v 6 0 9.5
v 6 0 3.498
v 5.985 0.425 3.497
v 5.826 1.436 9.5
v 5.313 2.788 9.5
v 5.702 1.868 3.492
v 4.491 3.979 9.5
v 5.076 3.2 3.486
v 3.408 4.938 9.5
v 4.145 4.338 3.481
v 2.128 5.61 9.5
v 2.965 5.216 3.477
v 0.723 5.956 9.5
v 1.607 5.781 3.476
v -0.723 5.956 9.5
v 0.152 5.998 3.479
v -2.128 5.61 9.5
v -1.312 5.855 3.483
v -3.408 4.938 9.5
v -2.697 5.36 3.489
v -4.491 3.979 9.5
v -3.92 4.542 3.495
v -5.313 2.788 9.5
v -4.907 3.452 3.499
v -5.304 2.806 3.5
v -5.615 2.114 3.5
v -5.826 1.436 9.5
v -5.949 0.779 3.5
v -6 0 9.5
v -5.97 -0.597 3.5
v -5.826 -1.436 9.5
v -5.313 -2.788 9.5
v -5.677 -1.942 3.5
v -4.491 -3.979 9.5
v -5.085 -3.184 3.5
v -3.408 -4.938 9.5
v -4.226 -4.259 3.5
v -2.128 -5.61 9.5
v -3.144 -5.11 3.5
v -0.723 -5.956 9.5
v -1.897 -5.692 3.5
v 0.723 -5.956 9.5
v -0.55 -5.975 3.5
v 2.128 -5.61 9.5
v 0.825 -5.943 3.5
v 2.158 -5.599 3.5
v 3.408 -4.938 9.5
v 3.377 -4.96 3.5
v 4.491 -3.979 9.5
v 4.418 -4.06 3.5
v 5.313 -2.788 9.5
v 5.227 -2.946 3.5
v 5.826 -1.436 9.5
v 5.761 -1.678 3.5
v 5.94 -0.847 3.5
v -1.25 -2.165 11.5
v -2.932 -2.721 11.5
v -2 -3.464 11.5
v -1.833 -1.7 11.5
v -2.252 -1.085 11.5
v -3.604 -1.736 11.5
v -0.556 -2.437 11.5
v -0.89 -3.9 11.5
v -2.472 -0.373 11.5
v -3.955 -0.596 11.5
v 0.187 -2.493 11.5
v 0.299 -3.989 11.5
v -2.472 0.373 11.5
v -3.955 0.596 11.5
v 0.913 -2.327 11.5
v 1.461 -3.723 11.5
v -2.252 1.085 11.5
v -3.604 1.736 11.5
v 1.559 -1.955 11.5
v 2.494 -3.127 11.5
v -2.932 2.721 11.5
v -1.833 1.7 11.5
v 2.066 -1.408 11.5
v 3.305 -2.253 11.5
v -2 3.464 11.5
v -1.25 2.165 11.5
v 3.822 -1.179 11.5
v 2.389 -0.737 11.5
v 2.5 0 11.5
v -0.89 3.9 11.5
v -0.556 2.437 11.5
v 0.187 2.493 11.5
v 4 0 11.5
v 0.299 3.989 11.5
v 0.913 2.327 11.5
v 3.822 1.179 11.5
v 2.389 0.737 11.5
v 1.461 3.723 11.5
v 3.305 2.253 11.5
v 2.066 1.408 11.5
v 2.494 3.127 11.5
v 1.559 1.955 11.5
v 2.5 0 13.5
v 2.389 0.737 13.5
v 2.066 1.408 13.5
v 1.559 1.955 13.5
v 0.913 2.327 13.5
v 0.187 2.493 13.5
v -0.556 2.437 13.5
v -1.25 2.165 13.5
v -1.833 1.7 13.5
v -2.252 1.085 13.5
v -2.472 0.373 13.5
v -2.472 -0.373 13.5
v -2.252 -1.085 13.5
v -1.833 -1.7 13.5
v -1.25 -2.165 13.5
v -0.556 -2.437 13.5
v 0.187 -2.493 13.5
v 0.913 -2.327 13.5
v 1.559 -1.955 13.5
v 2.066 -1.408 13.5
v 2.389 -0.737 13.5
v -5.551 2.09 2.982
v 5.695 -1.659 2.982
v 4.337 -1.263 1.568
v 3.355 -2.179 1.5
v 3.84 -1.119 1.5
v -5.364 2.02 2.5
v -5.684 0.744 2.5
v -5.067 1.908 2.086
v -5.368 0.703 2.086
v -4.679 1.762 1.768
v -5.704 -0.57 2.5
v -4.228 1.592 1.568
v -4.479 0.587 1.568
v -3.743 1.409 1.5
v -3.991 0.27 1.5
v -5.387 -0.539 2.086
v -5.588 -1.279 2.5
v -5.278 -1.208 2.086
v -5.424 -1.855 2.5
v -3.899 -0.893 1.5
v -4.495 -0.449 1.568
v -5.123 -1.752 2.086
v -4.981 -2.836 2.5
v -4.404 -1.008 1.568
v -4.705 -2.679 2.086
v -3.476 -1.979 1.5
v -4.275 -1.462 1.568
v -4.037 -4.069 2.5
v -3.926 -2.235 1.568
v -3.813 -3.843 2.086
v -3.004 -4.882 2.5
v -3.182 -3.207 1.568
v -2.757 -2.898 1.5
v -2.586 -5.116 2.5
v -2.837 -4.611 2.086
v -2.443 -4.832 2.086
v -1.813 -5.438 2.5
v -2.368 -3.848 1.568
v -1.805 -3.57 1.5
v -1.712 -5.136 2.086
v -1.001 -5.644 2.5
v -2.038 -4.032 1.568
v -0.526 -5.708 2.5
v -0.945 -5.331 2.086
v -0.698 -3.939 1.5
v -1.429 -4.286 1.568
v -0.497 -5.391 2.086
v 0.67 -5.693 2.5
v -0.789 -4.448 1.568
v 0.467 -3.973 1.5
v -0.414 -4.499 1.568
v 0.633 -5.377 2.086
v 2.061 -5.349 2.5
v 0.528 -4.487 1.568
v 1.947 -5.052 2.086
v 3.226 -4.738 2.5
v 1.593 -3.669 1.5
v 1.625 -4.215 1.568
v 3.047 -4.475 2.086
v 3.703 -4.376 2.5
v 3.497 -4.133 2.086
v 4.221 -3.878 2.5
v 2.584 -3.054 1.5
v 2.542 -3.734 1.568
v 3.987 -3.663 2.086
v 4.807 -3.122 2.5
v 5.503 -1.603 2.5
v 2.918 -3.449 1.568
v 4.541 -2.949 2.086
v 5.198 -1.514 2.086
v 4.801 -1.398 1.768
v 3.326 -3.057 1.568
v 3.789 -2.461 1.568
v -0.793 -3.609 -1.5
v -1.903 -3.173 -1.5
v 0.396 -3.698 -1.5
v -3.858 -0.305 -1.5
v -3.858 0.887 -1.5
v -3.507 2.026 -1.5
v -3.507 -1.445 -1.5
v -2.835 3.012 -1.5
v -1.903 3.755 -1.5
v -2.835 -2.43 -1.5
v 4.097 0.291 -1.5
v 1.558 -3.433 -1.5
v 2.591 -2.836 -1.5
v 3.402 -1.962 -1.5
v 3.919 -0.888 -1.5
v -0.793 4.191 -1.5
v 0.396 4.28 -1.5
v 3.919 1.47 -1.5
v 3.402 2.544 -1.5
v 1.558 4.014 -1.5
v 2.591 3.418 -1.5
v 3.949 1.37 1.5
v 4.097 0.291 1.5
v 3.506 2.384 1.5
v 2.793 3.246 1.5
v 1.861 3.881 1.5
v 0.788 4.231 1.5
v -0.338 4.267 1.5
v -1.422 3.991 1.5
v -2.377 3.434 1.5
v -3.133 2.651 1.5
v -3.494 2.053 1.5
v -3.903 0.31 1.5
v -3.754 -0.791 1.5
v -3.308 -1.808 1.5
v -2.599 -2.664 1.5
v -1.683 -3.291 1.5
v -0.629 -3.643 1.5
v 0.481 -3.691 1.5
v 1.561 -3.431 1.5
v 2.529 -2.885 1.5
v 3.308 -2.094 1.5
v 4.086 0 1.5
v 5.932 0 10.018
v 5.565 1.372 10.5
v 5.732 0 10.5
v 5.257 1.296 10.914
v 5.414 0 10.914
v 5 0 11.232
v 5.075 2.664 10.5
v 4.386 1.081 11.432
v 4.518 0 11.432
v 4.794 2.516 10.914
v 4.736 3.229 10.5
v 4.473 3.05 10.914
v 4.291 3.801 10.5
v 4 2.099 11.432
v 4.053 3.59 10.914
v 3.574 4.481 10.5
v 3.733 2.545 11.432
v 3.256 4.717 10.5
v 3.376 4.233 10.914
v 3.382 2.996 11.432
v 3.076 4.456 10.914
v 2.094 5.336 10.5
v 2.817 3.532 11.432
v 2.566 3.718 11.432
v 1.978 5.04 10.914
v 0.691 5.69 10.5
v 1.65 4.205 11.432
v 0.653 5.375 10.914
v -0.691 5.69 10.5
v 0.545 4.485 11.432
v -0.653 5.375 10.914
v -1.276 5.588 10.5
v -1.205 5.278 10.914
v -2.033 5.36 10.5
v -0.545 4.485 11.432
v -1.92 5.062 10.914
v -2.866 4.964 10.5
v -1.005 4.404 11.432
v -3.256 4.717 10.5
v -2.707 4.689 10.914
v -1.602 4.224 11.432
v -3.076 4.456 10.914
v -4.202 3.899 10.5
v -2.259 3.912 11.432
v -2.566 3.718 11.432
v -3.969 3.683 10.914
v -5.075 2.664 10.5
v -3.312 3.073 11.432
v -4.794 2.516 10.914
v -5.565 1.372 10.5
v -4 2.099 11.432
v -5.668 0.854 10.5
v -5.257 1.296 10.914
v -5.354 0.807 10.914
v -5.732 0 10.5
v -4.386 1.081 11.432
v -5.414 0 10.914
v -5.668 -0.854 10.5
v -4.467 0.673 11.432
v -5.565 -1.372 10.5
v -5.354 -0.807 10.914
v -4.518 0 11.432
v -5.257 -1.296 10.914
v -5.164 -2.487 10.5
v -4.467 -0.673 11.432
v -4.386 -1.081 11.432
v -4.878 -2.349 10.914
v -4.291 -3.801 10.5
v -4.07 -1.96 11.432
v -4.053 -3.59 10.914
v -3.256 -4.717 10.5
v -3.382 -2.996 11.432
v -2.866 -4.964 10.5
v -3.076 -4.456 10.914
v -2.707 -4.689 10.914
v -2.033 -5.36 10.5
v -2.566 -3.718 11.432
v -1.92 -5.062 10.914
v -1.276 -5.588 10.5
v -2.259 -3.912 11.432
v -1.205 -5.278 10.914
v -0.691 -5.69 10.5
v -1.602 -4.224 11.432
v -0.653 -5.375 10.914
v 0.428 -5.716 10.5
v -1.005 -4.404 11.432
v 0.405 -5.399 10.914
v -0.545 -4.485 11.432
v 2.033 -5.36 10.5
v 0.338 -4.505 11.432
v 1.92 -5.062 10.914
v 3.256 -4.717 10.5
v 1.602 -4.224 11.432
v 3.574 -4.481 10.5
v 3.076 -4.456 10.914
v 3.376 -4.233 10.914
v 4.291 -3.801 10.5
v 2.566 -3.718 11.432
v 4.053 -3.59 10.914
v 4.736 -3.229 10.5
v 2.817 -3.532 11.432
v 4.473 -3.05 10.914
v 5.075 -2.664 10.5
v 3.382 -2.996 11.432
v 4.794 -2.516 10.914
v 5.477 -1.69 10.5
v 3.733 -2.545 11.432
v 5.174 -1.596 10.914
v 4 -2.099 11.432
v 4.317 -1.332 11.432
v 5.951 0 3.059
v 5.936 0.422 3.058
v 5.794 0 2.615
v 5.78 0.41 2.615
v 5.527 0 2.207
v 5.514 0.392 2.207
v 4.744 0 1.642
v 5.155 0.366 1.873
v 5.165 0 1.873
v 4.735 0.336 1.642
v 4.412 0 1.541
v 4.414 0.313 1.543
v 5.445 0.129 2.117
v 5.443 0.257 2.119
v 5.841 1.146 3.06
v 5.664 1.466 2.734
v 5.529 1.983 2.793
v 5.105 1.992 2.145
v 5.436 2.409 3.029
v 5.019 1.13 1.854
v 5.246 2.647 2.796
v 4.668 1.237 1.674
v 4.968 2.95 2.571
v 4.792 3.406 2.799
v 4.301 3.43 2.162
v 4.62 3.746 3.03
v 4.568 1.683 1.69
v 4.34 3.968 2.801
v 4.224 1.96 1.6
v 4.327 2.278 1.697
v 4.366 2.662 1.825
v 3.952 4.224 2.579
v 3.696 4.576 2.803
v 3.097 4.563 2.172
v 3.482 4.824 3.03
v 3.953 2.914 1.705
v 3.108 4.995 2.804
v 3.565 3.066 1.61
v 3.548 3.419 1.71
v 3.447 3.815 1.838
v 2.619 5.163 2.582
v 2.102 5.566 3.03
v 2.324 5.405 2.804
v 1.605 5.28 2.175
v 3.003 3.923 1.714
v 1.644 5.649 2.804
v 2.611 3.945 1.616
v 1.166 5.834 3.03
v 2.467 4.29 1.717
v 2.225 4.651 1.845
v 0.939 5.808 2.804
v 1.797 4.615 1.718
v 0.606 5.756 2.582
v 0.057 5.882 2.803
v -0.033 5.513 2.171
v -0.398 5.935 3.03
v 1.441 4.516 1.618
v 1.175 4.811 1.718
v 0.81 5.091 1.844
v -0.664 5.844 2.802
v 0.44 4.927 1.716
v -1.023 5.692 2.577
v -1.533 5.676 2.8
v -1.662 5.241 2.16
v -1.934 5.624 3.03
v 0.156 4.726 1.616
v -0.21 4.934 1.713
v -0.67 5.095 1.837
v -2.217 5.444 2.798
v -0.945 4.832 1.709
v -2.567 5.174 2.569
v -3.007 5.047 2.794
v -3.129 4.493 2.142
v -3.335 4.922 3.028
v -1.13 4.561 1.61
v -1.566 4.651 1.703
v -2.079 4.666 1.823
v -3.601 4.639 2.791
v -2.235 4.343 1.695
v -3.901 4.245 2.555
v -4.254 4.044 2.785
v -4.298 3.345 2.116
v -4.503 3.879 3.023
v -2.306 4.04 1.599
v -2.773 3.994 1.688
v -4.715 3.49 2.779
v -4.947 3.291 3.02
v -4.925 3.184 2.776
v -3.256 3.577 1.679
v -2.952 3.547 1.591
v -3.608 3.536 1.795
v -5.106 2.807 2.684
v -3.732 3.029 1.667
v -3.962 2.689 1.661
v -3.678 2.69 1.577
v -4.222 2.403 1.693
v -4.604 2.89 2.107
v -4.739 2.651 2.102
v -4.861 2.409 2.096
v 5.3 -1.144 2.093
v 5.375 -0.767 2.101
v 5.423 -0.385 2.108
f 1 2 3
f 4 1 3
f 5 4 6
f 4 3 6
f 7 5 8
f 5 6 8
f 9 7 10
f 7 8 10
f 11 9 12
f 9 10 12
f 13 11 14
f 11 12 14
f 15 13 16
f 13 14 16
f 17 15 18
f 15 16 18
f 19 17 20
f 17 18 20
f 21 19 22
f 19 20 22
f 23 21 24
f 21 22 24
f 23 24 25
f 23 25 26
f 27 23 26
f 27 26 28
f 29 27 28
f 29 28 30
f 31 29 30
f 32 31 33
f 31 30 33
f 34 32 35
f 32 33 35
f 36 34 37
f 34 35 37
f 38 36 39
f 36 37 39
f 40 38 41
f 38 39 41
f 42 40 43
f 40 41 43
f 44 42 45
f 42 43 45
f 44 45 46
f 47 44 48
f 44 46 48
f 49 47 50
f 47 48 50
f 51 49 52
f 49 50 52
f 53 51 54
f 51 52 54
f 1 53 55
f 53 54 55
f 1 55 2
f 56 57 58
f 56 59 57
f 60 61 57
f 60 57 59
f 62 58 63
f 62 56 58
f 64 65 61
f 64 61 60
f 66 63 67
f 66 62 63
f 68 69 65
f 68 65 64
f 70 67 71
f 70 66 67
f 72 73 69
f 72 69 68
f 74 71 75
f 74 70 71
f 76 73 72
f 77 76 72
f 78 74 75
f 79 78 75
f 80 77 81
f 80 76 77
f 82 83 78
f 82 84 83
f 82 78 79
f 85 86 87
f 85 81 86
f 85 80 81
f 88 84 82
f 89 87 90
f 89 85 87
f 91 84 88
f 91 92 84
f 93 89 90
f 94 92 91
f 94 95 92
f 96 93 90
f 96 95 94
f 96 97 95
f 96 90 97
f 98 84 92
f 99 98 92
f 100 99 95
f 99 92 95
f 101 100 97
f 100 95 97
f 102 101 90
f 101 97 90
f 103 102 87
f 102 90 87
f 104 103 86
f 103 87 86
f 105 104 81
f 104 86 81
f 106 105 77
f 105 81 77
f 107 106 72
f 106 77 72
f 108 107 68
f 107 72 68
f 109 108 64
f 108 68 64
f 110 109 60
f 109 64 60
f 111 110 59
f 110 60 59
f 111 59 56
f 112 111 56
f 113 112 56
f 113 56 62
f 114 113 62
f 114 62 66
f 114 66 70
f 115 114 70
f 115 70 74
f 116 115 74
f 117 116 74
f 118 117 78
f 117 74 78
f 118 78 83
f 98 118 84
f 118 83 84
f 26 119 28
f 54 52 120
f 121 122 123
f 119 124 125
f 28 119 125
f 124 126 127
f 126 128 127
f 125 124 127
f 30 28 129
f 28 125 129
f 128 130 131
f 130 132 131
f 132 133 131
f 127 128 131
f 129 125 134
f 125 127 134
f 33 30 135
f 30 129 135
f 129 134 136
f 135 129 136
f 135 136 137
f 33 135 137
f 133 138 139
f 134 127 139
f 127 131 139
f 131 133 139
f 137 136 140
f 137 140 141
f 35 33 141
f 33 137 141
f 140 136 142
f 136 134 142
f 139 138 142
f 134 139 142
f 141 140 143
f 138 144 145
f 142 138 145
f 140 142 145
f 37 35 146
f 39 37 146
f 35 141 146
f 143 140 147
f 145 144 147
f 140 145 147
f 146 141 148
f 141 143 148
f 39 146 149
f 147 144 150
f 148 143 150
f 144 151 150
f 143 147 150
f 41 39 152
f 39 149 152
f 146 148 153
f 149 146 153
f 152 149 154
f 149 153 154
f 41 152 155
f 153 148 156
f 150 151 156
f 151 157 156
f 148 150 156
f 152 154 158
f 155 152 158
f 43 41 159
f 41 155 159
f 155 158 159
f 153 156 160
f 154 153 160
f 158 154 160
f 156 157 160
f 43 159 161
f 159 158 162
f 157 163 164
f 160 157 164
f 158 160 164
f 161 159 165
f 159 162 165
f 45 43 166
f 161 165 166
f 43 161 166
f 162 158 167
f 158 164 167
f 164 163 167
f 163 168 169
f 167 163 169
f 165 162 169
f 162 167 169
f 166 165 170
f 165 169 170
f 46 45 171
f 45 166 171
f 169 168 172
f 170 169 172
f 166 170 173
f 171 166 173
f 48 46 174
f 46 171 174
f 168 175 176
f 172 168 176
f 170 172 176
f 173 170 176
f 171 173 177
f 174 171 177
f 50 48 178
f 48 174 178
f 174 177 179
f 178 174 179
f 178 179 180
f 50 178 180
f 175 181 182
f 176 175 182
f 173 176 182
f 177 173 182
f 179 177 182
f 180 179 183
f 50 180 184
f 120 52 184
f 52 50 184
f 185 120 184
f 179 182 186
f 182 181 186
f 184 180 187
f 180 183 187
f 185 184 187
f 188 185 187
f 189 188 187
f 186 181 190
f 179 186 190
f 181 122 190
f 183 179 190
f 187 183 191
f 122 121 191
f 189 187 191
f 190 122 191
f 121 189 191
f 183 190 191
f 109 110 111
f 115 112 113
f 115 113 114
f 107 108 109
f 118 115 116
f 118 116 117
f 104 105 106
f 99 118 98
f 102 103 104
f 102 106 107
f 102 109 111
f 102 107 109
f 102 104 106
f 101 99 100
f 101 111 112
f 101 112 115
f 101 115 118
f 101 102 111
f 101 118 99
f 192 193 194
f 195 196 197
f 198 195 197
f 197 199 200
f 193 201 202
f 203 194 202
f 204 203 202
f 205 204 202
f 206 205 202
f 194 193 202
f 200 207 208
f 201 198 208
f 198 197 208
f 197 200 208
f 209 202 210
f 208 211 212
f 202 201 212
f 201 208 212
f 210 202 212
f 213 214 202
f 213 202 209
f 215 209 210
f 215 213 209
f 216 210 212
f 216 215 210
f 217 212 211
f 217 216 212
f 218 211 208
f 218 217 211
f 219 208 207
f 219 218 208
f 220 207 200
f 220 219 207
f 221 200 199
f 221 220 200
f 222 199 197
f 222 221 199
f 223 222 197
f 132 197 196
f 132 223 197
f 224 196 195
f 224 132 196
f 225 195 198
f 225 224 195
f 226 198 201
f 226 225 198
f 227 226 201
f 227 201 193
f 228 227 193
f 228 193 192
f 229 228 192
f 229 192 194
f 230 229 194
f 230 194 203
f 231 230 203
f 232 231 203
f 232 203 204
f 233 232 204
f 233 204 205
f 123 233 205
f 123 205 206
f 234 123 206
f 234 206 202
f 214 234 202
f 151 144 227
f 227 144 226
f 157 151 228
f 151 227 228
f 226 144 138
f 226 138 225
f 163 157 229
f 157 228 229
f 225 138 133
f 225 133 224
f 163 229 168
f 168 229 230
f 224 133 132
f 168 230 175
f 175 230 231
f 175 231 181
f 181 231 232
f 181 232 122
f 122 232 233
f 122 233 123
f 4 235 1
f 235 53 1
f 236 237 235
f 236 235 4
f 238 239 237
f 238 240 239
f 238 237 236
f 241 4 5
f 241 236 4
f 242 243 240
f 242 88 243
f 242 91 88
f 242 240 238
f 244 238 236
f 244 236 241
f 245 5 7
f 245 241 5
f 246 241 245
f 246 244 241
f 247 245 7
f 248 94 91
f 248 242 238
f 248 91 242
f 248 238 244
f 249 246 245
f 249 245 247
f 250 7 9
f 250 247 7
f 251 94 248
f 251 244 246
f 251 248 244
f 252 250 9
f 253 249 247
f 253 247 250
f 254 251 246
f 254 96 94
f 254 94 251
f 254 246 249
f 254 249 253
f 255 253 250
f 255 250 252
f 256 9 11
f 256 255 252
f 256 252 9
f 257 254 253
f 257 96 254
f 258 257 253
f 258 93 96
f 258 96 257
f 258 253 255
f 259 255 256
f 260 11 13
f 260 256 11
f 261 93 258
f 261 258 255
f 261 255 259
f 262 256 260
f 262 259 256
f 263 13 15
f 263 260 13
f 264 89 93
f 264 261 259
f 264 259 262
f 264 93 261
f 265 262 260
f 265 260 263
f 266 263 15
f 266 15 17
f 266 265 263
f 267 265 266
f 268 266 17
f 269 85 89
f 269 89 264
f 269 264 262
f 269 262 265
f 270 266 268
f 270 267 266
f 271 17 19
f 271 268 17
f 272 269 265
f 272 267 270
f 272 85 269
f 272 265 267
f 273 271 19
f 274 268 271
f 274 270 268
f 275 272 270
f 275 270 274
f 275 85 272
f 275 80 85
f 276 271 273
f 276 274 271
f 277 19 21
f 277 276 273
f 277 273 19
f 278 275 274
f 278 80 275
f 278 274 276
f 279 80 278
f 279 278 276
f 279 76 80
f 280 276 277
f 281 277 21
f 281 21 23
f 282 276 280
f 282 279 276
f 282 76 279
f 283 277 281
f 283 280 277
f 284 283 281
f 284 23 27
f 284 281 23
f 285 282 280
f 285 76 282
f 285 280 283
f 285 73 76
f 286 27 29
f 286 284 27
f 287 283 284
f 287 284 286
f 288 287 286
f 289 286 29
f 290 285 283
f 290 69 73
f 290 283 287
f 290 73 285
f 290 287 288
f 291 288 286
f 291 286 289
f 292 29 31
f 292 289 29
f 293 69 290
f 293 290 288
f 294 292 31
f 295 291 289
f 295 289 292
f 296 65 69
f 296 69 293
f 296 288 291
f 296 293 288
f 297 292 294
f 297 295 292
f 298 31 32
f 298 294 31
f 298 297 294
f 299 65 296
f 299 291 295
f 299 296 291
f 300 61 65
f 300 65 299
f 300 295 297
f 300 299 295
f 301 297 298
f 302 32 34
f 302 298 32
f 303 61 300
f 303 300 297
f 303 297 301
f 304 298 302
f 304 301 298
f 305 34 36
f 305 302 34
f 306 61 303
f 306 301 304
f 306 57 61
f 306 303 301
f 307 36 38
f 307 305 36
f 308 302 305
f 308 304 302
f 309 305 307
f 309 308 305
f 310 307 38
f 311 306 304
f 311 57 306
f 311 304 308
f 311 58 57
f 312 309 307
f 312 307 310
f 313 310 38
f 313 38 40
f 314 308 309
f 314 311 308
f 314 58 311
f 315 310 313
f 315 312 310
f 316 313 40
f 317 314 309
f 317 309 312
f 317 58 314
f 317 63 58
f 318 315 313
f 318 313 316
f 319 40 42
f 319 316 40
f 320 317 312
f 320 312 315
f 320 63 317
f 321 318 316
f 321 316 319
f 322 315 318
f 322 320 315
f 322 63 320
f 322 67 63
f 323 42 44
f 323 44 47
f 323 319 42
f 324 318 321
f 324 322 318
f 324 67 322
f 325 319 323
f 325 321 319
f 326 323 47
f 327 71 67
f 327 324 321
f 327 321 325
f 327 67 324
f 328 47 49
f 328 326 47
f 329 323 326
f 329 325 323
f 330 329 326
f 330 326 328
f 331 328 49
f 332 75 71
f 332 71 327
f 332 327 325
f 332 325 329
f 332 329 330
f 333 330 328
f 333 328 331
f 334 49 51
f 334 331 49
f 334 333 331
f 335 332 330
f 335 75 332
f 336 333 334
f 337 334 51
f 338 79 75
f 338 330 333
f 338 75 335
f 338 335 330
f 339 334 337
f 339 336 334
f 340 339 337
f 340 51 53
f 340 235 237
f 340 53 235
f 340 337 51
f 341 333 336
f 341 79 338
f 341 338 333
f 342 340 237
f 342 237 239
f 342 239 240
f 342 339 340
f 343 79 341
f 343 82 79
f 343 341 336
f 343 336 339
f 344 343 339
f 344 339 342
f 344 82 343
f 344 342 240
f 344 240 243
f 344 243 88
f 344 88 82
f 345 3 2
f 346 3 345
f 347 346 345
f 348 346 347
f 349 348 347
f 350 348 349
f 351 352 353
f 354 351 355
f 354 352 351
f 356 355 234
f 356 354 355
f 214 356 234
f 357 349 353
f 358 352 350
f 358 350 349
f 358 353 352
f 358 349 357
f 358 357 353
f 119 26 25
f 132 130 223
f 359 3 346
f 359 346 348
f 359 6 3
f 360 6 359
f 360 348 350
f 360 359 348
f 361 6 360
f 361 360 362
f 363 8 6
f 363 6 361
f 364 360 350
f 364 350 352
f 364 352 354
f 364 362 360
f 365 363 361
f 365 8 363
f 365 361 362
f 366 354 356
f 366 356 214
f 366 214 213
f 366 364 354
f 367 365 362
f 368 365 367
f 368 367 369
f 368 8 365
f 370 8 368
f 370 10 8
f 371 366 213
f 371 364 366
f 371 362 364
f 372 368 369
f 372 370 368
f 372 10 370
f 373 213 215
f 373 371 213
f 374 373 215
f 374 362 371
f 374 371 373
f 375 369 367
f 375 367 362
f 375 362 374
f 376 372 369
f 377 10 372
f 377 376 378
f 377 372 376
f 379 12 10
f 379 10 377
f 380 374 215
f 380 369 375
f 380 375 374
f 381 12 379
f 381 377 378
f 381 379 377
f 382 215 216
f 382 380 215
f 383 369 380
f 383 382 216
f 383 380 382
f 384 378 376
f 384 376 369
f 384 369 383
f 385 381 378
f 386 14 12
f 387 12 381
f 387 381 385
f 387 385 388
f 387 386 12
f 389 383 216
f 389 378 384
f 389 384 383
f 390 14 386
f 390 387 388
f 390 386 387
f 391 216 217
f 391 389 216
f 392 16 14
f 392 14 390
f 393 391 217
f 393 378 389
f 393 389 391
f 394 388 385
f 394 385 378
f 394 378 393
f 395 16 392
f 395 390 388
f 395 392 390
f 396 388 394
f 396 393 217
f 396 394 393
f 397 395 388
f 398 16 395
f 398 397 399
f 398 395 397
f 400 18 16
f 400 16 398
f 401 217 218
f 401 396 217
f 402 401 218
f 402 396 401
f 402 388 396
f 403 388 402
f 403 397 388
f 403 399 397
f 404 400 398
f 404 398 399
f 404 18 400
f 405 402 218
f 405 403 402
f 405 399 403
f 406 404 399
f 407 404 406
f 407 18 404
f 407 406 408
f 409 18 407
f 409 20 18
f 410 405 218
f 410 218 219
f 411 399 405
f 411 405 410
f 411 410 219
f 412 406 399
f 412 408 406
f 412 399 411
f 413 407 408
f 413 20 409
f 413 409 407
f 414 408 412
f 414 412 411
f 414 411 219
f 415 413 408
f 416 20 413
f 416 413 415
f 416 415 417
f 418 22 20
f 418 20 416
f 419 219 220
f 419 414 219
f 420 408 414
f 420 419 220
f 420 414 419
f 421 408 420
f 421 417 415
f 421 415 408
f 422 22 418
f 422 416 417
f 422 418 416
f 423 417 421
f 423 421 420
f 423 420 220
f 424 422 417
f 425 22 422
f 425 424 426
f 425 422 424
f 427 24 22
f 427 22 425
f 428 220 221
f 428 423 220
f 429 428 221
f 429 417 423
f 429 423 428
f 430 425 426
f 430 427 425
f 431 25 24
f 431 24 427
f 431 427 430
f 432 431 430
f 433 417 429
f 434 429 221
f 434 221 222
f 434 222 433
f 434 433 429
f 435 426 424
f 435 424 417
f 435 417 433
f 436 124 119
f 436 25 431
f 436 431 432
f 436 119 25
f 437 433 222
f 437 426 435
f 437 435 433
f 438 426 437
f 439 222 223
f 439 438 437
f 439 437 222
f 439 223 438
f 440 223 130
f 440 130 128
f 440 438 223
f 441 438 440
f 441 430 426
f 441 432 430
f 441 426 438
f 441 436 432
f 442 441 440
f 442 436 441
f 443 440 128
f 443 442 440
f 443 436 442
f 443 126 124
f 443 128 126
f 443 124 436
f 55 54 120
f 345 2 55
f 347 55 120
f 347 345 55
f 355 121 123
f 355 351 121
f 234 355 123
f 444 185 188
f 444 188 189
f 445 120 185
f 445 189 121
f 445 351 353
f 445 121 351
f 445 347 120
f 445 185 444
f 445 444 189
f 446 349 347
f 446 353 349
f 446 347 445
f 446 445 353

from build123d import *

# Parameters (mm, degrees)
F0_R     = 4
F1_DEPTH = 1.5
F2_R     = 6
F3_DEPTH = 10
F4_R     = 2.5
F5_DEPTH = 2
F6_R     = 2


with BuildPart() as f1:
    # F0 (on Top) → F1 (new body, symmetric)
    with BuildSketch(Plane.XY):
        with Locations((0.096983, 0.290948)):
            Circle(F0_R)
    extrude(amount=F1_DEPTH, both=True)

    # F2 (on face) → F3 (join)
    with BuildSketch(Plane.XY.offset(1.5)):
        Circle(F2_R)
    extrude(amount=F3_DEPTH)

    # F4 (on face) → F5 (join)
    with BuildSketch(Plane.XY.offset(11.5)):
        Circle(F4_R)
    extrude(amount=F5_DEPTH)

    # F6
    f6_edges = [f1.edges().sort_by_distance(p)[0] for p in [
        (-6, 0, 1.5),
        (-6, 0, 11.5),
    ]]
    fillet(f6_edges, radius=F6_R)


solid = f1.part
